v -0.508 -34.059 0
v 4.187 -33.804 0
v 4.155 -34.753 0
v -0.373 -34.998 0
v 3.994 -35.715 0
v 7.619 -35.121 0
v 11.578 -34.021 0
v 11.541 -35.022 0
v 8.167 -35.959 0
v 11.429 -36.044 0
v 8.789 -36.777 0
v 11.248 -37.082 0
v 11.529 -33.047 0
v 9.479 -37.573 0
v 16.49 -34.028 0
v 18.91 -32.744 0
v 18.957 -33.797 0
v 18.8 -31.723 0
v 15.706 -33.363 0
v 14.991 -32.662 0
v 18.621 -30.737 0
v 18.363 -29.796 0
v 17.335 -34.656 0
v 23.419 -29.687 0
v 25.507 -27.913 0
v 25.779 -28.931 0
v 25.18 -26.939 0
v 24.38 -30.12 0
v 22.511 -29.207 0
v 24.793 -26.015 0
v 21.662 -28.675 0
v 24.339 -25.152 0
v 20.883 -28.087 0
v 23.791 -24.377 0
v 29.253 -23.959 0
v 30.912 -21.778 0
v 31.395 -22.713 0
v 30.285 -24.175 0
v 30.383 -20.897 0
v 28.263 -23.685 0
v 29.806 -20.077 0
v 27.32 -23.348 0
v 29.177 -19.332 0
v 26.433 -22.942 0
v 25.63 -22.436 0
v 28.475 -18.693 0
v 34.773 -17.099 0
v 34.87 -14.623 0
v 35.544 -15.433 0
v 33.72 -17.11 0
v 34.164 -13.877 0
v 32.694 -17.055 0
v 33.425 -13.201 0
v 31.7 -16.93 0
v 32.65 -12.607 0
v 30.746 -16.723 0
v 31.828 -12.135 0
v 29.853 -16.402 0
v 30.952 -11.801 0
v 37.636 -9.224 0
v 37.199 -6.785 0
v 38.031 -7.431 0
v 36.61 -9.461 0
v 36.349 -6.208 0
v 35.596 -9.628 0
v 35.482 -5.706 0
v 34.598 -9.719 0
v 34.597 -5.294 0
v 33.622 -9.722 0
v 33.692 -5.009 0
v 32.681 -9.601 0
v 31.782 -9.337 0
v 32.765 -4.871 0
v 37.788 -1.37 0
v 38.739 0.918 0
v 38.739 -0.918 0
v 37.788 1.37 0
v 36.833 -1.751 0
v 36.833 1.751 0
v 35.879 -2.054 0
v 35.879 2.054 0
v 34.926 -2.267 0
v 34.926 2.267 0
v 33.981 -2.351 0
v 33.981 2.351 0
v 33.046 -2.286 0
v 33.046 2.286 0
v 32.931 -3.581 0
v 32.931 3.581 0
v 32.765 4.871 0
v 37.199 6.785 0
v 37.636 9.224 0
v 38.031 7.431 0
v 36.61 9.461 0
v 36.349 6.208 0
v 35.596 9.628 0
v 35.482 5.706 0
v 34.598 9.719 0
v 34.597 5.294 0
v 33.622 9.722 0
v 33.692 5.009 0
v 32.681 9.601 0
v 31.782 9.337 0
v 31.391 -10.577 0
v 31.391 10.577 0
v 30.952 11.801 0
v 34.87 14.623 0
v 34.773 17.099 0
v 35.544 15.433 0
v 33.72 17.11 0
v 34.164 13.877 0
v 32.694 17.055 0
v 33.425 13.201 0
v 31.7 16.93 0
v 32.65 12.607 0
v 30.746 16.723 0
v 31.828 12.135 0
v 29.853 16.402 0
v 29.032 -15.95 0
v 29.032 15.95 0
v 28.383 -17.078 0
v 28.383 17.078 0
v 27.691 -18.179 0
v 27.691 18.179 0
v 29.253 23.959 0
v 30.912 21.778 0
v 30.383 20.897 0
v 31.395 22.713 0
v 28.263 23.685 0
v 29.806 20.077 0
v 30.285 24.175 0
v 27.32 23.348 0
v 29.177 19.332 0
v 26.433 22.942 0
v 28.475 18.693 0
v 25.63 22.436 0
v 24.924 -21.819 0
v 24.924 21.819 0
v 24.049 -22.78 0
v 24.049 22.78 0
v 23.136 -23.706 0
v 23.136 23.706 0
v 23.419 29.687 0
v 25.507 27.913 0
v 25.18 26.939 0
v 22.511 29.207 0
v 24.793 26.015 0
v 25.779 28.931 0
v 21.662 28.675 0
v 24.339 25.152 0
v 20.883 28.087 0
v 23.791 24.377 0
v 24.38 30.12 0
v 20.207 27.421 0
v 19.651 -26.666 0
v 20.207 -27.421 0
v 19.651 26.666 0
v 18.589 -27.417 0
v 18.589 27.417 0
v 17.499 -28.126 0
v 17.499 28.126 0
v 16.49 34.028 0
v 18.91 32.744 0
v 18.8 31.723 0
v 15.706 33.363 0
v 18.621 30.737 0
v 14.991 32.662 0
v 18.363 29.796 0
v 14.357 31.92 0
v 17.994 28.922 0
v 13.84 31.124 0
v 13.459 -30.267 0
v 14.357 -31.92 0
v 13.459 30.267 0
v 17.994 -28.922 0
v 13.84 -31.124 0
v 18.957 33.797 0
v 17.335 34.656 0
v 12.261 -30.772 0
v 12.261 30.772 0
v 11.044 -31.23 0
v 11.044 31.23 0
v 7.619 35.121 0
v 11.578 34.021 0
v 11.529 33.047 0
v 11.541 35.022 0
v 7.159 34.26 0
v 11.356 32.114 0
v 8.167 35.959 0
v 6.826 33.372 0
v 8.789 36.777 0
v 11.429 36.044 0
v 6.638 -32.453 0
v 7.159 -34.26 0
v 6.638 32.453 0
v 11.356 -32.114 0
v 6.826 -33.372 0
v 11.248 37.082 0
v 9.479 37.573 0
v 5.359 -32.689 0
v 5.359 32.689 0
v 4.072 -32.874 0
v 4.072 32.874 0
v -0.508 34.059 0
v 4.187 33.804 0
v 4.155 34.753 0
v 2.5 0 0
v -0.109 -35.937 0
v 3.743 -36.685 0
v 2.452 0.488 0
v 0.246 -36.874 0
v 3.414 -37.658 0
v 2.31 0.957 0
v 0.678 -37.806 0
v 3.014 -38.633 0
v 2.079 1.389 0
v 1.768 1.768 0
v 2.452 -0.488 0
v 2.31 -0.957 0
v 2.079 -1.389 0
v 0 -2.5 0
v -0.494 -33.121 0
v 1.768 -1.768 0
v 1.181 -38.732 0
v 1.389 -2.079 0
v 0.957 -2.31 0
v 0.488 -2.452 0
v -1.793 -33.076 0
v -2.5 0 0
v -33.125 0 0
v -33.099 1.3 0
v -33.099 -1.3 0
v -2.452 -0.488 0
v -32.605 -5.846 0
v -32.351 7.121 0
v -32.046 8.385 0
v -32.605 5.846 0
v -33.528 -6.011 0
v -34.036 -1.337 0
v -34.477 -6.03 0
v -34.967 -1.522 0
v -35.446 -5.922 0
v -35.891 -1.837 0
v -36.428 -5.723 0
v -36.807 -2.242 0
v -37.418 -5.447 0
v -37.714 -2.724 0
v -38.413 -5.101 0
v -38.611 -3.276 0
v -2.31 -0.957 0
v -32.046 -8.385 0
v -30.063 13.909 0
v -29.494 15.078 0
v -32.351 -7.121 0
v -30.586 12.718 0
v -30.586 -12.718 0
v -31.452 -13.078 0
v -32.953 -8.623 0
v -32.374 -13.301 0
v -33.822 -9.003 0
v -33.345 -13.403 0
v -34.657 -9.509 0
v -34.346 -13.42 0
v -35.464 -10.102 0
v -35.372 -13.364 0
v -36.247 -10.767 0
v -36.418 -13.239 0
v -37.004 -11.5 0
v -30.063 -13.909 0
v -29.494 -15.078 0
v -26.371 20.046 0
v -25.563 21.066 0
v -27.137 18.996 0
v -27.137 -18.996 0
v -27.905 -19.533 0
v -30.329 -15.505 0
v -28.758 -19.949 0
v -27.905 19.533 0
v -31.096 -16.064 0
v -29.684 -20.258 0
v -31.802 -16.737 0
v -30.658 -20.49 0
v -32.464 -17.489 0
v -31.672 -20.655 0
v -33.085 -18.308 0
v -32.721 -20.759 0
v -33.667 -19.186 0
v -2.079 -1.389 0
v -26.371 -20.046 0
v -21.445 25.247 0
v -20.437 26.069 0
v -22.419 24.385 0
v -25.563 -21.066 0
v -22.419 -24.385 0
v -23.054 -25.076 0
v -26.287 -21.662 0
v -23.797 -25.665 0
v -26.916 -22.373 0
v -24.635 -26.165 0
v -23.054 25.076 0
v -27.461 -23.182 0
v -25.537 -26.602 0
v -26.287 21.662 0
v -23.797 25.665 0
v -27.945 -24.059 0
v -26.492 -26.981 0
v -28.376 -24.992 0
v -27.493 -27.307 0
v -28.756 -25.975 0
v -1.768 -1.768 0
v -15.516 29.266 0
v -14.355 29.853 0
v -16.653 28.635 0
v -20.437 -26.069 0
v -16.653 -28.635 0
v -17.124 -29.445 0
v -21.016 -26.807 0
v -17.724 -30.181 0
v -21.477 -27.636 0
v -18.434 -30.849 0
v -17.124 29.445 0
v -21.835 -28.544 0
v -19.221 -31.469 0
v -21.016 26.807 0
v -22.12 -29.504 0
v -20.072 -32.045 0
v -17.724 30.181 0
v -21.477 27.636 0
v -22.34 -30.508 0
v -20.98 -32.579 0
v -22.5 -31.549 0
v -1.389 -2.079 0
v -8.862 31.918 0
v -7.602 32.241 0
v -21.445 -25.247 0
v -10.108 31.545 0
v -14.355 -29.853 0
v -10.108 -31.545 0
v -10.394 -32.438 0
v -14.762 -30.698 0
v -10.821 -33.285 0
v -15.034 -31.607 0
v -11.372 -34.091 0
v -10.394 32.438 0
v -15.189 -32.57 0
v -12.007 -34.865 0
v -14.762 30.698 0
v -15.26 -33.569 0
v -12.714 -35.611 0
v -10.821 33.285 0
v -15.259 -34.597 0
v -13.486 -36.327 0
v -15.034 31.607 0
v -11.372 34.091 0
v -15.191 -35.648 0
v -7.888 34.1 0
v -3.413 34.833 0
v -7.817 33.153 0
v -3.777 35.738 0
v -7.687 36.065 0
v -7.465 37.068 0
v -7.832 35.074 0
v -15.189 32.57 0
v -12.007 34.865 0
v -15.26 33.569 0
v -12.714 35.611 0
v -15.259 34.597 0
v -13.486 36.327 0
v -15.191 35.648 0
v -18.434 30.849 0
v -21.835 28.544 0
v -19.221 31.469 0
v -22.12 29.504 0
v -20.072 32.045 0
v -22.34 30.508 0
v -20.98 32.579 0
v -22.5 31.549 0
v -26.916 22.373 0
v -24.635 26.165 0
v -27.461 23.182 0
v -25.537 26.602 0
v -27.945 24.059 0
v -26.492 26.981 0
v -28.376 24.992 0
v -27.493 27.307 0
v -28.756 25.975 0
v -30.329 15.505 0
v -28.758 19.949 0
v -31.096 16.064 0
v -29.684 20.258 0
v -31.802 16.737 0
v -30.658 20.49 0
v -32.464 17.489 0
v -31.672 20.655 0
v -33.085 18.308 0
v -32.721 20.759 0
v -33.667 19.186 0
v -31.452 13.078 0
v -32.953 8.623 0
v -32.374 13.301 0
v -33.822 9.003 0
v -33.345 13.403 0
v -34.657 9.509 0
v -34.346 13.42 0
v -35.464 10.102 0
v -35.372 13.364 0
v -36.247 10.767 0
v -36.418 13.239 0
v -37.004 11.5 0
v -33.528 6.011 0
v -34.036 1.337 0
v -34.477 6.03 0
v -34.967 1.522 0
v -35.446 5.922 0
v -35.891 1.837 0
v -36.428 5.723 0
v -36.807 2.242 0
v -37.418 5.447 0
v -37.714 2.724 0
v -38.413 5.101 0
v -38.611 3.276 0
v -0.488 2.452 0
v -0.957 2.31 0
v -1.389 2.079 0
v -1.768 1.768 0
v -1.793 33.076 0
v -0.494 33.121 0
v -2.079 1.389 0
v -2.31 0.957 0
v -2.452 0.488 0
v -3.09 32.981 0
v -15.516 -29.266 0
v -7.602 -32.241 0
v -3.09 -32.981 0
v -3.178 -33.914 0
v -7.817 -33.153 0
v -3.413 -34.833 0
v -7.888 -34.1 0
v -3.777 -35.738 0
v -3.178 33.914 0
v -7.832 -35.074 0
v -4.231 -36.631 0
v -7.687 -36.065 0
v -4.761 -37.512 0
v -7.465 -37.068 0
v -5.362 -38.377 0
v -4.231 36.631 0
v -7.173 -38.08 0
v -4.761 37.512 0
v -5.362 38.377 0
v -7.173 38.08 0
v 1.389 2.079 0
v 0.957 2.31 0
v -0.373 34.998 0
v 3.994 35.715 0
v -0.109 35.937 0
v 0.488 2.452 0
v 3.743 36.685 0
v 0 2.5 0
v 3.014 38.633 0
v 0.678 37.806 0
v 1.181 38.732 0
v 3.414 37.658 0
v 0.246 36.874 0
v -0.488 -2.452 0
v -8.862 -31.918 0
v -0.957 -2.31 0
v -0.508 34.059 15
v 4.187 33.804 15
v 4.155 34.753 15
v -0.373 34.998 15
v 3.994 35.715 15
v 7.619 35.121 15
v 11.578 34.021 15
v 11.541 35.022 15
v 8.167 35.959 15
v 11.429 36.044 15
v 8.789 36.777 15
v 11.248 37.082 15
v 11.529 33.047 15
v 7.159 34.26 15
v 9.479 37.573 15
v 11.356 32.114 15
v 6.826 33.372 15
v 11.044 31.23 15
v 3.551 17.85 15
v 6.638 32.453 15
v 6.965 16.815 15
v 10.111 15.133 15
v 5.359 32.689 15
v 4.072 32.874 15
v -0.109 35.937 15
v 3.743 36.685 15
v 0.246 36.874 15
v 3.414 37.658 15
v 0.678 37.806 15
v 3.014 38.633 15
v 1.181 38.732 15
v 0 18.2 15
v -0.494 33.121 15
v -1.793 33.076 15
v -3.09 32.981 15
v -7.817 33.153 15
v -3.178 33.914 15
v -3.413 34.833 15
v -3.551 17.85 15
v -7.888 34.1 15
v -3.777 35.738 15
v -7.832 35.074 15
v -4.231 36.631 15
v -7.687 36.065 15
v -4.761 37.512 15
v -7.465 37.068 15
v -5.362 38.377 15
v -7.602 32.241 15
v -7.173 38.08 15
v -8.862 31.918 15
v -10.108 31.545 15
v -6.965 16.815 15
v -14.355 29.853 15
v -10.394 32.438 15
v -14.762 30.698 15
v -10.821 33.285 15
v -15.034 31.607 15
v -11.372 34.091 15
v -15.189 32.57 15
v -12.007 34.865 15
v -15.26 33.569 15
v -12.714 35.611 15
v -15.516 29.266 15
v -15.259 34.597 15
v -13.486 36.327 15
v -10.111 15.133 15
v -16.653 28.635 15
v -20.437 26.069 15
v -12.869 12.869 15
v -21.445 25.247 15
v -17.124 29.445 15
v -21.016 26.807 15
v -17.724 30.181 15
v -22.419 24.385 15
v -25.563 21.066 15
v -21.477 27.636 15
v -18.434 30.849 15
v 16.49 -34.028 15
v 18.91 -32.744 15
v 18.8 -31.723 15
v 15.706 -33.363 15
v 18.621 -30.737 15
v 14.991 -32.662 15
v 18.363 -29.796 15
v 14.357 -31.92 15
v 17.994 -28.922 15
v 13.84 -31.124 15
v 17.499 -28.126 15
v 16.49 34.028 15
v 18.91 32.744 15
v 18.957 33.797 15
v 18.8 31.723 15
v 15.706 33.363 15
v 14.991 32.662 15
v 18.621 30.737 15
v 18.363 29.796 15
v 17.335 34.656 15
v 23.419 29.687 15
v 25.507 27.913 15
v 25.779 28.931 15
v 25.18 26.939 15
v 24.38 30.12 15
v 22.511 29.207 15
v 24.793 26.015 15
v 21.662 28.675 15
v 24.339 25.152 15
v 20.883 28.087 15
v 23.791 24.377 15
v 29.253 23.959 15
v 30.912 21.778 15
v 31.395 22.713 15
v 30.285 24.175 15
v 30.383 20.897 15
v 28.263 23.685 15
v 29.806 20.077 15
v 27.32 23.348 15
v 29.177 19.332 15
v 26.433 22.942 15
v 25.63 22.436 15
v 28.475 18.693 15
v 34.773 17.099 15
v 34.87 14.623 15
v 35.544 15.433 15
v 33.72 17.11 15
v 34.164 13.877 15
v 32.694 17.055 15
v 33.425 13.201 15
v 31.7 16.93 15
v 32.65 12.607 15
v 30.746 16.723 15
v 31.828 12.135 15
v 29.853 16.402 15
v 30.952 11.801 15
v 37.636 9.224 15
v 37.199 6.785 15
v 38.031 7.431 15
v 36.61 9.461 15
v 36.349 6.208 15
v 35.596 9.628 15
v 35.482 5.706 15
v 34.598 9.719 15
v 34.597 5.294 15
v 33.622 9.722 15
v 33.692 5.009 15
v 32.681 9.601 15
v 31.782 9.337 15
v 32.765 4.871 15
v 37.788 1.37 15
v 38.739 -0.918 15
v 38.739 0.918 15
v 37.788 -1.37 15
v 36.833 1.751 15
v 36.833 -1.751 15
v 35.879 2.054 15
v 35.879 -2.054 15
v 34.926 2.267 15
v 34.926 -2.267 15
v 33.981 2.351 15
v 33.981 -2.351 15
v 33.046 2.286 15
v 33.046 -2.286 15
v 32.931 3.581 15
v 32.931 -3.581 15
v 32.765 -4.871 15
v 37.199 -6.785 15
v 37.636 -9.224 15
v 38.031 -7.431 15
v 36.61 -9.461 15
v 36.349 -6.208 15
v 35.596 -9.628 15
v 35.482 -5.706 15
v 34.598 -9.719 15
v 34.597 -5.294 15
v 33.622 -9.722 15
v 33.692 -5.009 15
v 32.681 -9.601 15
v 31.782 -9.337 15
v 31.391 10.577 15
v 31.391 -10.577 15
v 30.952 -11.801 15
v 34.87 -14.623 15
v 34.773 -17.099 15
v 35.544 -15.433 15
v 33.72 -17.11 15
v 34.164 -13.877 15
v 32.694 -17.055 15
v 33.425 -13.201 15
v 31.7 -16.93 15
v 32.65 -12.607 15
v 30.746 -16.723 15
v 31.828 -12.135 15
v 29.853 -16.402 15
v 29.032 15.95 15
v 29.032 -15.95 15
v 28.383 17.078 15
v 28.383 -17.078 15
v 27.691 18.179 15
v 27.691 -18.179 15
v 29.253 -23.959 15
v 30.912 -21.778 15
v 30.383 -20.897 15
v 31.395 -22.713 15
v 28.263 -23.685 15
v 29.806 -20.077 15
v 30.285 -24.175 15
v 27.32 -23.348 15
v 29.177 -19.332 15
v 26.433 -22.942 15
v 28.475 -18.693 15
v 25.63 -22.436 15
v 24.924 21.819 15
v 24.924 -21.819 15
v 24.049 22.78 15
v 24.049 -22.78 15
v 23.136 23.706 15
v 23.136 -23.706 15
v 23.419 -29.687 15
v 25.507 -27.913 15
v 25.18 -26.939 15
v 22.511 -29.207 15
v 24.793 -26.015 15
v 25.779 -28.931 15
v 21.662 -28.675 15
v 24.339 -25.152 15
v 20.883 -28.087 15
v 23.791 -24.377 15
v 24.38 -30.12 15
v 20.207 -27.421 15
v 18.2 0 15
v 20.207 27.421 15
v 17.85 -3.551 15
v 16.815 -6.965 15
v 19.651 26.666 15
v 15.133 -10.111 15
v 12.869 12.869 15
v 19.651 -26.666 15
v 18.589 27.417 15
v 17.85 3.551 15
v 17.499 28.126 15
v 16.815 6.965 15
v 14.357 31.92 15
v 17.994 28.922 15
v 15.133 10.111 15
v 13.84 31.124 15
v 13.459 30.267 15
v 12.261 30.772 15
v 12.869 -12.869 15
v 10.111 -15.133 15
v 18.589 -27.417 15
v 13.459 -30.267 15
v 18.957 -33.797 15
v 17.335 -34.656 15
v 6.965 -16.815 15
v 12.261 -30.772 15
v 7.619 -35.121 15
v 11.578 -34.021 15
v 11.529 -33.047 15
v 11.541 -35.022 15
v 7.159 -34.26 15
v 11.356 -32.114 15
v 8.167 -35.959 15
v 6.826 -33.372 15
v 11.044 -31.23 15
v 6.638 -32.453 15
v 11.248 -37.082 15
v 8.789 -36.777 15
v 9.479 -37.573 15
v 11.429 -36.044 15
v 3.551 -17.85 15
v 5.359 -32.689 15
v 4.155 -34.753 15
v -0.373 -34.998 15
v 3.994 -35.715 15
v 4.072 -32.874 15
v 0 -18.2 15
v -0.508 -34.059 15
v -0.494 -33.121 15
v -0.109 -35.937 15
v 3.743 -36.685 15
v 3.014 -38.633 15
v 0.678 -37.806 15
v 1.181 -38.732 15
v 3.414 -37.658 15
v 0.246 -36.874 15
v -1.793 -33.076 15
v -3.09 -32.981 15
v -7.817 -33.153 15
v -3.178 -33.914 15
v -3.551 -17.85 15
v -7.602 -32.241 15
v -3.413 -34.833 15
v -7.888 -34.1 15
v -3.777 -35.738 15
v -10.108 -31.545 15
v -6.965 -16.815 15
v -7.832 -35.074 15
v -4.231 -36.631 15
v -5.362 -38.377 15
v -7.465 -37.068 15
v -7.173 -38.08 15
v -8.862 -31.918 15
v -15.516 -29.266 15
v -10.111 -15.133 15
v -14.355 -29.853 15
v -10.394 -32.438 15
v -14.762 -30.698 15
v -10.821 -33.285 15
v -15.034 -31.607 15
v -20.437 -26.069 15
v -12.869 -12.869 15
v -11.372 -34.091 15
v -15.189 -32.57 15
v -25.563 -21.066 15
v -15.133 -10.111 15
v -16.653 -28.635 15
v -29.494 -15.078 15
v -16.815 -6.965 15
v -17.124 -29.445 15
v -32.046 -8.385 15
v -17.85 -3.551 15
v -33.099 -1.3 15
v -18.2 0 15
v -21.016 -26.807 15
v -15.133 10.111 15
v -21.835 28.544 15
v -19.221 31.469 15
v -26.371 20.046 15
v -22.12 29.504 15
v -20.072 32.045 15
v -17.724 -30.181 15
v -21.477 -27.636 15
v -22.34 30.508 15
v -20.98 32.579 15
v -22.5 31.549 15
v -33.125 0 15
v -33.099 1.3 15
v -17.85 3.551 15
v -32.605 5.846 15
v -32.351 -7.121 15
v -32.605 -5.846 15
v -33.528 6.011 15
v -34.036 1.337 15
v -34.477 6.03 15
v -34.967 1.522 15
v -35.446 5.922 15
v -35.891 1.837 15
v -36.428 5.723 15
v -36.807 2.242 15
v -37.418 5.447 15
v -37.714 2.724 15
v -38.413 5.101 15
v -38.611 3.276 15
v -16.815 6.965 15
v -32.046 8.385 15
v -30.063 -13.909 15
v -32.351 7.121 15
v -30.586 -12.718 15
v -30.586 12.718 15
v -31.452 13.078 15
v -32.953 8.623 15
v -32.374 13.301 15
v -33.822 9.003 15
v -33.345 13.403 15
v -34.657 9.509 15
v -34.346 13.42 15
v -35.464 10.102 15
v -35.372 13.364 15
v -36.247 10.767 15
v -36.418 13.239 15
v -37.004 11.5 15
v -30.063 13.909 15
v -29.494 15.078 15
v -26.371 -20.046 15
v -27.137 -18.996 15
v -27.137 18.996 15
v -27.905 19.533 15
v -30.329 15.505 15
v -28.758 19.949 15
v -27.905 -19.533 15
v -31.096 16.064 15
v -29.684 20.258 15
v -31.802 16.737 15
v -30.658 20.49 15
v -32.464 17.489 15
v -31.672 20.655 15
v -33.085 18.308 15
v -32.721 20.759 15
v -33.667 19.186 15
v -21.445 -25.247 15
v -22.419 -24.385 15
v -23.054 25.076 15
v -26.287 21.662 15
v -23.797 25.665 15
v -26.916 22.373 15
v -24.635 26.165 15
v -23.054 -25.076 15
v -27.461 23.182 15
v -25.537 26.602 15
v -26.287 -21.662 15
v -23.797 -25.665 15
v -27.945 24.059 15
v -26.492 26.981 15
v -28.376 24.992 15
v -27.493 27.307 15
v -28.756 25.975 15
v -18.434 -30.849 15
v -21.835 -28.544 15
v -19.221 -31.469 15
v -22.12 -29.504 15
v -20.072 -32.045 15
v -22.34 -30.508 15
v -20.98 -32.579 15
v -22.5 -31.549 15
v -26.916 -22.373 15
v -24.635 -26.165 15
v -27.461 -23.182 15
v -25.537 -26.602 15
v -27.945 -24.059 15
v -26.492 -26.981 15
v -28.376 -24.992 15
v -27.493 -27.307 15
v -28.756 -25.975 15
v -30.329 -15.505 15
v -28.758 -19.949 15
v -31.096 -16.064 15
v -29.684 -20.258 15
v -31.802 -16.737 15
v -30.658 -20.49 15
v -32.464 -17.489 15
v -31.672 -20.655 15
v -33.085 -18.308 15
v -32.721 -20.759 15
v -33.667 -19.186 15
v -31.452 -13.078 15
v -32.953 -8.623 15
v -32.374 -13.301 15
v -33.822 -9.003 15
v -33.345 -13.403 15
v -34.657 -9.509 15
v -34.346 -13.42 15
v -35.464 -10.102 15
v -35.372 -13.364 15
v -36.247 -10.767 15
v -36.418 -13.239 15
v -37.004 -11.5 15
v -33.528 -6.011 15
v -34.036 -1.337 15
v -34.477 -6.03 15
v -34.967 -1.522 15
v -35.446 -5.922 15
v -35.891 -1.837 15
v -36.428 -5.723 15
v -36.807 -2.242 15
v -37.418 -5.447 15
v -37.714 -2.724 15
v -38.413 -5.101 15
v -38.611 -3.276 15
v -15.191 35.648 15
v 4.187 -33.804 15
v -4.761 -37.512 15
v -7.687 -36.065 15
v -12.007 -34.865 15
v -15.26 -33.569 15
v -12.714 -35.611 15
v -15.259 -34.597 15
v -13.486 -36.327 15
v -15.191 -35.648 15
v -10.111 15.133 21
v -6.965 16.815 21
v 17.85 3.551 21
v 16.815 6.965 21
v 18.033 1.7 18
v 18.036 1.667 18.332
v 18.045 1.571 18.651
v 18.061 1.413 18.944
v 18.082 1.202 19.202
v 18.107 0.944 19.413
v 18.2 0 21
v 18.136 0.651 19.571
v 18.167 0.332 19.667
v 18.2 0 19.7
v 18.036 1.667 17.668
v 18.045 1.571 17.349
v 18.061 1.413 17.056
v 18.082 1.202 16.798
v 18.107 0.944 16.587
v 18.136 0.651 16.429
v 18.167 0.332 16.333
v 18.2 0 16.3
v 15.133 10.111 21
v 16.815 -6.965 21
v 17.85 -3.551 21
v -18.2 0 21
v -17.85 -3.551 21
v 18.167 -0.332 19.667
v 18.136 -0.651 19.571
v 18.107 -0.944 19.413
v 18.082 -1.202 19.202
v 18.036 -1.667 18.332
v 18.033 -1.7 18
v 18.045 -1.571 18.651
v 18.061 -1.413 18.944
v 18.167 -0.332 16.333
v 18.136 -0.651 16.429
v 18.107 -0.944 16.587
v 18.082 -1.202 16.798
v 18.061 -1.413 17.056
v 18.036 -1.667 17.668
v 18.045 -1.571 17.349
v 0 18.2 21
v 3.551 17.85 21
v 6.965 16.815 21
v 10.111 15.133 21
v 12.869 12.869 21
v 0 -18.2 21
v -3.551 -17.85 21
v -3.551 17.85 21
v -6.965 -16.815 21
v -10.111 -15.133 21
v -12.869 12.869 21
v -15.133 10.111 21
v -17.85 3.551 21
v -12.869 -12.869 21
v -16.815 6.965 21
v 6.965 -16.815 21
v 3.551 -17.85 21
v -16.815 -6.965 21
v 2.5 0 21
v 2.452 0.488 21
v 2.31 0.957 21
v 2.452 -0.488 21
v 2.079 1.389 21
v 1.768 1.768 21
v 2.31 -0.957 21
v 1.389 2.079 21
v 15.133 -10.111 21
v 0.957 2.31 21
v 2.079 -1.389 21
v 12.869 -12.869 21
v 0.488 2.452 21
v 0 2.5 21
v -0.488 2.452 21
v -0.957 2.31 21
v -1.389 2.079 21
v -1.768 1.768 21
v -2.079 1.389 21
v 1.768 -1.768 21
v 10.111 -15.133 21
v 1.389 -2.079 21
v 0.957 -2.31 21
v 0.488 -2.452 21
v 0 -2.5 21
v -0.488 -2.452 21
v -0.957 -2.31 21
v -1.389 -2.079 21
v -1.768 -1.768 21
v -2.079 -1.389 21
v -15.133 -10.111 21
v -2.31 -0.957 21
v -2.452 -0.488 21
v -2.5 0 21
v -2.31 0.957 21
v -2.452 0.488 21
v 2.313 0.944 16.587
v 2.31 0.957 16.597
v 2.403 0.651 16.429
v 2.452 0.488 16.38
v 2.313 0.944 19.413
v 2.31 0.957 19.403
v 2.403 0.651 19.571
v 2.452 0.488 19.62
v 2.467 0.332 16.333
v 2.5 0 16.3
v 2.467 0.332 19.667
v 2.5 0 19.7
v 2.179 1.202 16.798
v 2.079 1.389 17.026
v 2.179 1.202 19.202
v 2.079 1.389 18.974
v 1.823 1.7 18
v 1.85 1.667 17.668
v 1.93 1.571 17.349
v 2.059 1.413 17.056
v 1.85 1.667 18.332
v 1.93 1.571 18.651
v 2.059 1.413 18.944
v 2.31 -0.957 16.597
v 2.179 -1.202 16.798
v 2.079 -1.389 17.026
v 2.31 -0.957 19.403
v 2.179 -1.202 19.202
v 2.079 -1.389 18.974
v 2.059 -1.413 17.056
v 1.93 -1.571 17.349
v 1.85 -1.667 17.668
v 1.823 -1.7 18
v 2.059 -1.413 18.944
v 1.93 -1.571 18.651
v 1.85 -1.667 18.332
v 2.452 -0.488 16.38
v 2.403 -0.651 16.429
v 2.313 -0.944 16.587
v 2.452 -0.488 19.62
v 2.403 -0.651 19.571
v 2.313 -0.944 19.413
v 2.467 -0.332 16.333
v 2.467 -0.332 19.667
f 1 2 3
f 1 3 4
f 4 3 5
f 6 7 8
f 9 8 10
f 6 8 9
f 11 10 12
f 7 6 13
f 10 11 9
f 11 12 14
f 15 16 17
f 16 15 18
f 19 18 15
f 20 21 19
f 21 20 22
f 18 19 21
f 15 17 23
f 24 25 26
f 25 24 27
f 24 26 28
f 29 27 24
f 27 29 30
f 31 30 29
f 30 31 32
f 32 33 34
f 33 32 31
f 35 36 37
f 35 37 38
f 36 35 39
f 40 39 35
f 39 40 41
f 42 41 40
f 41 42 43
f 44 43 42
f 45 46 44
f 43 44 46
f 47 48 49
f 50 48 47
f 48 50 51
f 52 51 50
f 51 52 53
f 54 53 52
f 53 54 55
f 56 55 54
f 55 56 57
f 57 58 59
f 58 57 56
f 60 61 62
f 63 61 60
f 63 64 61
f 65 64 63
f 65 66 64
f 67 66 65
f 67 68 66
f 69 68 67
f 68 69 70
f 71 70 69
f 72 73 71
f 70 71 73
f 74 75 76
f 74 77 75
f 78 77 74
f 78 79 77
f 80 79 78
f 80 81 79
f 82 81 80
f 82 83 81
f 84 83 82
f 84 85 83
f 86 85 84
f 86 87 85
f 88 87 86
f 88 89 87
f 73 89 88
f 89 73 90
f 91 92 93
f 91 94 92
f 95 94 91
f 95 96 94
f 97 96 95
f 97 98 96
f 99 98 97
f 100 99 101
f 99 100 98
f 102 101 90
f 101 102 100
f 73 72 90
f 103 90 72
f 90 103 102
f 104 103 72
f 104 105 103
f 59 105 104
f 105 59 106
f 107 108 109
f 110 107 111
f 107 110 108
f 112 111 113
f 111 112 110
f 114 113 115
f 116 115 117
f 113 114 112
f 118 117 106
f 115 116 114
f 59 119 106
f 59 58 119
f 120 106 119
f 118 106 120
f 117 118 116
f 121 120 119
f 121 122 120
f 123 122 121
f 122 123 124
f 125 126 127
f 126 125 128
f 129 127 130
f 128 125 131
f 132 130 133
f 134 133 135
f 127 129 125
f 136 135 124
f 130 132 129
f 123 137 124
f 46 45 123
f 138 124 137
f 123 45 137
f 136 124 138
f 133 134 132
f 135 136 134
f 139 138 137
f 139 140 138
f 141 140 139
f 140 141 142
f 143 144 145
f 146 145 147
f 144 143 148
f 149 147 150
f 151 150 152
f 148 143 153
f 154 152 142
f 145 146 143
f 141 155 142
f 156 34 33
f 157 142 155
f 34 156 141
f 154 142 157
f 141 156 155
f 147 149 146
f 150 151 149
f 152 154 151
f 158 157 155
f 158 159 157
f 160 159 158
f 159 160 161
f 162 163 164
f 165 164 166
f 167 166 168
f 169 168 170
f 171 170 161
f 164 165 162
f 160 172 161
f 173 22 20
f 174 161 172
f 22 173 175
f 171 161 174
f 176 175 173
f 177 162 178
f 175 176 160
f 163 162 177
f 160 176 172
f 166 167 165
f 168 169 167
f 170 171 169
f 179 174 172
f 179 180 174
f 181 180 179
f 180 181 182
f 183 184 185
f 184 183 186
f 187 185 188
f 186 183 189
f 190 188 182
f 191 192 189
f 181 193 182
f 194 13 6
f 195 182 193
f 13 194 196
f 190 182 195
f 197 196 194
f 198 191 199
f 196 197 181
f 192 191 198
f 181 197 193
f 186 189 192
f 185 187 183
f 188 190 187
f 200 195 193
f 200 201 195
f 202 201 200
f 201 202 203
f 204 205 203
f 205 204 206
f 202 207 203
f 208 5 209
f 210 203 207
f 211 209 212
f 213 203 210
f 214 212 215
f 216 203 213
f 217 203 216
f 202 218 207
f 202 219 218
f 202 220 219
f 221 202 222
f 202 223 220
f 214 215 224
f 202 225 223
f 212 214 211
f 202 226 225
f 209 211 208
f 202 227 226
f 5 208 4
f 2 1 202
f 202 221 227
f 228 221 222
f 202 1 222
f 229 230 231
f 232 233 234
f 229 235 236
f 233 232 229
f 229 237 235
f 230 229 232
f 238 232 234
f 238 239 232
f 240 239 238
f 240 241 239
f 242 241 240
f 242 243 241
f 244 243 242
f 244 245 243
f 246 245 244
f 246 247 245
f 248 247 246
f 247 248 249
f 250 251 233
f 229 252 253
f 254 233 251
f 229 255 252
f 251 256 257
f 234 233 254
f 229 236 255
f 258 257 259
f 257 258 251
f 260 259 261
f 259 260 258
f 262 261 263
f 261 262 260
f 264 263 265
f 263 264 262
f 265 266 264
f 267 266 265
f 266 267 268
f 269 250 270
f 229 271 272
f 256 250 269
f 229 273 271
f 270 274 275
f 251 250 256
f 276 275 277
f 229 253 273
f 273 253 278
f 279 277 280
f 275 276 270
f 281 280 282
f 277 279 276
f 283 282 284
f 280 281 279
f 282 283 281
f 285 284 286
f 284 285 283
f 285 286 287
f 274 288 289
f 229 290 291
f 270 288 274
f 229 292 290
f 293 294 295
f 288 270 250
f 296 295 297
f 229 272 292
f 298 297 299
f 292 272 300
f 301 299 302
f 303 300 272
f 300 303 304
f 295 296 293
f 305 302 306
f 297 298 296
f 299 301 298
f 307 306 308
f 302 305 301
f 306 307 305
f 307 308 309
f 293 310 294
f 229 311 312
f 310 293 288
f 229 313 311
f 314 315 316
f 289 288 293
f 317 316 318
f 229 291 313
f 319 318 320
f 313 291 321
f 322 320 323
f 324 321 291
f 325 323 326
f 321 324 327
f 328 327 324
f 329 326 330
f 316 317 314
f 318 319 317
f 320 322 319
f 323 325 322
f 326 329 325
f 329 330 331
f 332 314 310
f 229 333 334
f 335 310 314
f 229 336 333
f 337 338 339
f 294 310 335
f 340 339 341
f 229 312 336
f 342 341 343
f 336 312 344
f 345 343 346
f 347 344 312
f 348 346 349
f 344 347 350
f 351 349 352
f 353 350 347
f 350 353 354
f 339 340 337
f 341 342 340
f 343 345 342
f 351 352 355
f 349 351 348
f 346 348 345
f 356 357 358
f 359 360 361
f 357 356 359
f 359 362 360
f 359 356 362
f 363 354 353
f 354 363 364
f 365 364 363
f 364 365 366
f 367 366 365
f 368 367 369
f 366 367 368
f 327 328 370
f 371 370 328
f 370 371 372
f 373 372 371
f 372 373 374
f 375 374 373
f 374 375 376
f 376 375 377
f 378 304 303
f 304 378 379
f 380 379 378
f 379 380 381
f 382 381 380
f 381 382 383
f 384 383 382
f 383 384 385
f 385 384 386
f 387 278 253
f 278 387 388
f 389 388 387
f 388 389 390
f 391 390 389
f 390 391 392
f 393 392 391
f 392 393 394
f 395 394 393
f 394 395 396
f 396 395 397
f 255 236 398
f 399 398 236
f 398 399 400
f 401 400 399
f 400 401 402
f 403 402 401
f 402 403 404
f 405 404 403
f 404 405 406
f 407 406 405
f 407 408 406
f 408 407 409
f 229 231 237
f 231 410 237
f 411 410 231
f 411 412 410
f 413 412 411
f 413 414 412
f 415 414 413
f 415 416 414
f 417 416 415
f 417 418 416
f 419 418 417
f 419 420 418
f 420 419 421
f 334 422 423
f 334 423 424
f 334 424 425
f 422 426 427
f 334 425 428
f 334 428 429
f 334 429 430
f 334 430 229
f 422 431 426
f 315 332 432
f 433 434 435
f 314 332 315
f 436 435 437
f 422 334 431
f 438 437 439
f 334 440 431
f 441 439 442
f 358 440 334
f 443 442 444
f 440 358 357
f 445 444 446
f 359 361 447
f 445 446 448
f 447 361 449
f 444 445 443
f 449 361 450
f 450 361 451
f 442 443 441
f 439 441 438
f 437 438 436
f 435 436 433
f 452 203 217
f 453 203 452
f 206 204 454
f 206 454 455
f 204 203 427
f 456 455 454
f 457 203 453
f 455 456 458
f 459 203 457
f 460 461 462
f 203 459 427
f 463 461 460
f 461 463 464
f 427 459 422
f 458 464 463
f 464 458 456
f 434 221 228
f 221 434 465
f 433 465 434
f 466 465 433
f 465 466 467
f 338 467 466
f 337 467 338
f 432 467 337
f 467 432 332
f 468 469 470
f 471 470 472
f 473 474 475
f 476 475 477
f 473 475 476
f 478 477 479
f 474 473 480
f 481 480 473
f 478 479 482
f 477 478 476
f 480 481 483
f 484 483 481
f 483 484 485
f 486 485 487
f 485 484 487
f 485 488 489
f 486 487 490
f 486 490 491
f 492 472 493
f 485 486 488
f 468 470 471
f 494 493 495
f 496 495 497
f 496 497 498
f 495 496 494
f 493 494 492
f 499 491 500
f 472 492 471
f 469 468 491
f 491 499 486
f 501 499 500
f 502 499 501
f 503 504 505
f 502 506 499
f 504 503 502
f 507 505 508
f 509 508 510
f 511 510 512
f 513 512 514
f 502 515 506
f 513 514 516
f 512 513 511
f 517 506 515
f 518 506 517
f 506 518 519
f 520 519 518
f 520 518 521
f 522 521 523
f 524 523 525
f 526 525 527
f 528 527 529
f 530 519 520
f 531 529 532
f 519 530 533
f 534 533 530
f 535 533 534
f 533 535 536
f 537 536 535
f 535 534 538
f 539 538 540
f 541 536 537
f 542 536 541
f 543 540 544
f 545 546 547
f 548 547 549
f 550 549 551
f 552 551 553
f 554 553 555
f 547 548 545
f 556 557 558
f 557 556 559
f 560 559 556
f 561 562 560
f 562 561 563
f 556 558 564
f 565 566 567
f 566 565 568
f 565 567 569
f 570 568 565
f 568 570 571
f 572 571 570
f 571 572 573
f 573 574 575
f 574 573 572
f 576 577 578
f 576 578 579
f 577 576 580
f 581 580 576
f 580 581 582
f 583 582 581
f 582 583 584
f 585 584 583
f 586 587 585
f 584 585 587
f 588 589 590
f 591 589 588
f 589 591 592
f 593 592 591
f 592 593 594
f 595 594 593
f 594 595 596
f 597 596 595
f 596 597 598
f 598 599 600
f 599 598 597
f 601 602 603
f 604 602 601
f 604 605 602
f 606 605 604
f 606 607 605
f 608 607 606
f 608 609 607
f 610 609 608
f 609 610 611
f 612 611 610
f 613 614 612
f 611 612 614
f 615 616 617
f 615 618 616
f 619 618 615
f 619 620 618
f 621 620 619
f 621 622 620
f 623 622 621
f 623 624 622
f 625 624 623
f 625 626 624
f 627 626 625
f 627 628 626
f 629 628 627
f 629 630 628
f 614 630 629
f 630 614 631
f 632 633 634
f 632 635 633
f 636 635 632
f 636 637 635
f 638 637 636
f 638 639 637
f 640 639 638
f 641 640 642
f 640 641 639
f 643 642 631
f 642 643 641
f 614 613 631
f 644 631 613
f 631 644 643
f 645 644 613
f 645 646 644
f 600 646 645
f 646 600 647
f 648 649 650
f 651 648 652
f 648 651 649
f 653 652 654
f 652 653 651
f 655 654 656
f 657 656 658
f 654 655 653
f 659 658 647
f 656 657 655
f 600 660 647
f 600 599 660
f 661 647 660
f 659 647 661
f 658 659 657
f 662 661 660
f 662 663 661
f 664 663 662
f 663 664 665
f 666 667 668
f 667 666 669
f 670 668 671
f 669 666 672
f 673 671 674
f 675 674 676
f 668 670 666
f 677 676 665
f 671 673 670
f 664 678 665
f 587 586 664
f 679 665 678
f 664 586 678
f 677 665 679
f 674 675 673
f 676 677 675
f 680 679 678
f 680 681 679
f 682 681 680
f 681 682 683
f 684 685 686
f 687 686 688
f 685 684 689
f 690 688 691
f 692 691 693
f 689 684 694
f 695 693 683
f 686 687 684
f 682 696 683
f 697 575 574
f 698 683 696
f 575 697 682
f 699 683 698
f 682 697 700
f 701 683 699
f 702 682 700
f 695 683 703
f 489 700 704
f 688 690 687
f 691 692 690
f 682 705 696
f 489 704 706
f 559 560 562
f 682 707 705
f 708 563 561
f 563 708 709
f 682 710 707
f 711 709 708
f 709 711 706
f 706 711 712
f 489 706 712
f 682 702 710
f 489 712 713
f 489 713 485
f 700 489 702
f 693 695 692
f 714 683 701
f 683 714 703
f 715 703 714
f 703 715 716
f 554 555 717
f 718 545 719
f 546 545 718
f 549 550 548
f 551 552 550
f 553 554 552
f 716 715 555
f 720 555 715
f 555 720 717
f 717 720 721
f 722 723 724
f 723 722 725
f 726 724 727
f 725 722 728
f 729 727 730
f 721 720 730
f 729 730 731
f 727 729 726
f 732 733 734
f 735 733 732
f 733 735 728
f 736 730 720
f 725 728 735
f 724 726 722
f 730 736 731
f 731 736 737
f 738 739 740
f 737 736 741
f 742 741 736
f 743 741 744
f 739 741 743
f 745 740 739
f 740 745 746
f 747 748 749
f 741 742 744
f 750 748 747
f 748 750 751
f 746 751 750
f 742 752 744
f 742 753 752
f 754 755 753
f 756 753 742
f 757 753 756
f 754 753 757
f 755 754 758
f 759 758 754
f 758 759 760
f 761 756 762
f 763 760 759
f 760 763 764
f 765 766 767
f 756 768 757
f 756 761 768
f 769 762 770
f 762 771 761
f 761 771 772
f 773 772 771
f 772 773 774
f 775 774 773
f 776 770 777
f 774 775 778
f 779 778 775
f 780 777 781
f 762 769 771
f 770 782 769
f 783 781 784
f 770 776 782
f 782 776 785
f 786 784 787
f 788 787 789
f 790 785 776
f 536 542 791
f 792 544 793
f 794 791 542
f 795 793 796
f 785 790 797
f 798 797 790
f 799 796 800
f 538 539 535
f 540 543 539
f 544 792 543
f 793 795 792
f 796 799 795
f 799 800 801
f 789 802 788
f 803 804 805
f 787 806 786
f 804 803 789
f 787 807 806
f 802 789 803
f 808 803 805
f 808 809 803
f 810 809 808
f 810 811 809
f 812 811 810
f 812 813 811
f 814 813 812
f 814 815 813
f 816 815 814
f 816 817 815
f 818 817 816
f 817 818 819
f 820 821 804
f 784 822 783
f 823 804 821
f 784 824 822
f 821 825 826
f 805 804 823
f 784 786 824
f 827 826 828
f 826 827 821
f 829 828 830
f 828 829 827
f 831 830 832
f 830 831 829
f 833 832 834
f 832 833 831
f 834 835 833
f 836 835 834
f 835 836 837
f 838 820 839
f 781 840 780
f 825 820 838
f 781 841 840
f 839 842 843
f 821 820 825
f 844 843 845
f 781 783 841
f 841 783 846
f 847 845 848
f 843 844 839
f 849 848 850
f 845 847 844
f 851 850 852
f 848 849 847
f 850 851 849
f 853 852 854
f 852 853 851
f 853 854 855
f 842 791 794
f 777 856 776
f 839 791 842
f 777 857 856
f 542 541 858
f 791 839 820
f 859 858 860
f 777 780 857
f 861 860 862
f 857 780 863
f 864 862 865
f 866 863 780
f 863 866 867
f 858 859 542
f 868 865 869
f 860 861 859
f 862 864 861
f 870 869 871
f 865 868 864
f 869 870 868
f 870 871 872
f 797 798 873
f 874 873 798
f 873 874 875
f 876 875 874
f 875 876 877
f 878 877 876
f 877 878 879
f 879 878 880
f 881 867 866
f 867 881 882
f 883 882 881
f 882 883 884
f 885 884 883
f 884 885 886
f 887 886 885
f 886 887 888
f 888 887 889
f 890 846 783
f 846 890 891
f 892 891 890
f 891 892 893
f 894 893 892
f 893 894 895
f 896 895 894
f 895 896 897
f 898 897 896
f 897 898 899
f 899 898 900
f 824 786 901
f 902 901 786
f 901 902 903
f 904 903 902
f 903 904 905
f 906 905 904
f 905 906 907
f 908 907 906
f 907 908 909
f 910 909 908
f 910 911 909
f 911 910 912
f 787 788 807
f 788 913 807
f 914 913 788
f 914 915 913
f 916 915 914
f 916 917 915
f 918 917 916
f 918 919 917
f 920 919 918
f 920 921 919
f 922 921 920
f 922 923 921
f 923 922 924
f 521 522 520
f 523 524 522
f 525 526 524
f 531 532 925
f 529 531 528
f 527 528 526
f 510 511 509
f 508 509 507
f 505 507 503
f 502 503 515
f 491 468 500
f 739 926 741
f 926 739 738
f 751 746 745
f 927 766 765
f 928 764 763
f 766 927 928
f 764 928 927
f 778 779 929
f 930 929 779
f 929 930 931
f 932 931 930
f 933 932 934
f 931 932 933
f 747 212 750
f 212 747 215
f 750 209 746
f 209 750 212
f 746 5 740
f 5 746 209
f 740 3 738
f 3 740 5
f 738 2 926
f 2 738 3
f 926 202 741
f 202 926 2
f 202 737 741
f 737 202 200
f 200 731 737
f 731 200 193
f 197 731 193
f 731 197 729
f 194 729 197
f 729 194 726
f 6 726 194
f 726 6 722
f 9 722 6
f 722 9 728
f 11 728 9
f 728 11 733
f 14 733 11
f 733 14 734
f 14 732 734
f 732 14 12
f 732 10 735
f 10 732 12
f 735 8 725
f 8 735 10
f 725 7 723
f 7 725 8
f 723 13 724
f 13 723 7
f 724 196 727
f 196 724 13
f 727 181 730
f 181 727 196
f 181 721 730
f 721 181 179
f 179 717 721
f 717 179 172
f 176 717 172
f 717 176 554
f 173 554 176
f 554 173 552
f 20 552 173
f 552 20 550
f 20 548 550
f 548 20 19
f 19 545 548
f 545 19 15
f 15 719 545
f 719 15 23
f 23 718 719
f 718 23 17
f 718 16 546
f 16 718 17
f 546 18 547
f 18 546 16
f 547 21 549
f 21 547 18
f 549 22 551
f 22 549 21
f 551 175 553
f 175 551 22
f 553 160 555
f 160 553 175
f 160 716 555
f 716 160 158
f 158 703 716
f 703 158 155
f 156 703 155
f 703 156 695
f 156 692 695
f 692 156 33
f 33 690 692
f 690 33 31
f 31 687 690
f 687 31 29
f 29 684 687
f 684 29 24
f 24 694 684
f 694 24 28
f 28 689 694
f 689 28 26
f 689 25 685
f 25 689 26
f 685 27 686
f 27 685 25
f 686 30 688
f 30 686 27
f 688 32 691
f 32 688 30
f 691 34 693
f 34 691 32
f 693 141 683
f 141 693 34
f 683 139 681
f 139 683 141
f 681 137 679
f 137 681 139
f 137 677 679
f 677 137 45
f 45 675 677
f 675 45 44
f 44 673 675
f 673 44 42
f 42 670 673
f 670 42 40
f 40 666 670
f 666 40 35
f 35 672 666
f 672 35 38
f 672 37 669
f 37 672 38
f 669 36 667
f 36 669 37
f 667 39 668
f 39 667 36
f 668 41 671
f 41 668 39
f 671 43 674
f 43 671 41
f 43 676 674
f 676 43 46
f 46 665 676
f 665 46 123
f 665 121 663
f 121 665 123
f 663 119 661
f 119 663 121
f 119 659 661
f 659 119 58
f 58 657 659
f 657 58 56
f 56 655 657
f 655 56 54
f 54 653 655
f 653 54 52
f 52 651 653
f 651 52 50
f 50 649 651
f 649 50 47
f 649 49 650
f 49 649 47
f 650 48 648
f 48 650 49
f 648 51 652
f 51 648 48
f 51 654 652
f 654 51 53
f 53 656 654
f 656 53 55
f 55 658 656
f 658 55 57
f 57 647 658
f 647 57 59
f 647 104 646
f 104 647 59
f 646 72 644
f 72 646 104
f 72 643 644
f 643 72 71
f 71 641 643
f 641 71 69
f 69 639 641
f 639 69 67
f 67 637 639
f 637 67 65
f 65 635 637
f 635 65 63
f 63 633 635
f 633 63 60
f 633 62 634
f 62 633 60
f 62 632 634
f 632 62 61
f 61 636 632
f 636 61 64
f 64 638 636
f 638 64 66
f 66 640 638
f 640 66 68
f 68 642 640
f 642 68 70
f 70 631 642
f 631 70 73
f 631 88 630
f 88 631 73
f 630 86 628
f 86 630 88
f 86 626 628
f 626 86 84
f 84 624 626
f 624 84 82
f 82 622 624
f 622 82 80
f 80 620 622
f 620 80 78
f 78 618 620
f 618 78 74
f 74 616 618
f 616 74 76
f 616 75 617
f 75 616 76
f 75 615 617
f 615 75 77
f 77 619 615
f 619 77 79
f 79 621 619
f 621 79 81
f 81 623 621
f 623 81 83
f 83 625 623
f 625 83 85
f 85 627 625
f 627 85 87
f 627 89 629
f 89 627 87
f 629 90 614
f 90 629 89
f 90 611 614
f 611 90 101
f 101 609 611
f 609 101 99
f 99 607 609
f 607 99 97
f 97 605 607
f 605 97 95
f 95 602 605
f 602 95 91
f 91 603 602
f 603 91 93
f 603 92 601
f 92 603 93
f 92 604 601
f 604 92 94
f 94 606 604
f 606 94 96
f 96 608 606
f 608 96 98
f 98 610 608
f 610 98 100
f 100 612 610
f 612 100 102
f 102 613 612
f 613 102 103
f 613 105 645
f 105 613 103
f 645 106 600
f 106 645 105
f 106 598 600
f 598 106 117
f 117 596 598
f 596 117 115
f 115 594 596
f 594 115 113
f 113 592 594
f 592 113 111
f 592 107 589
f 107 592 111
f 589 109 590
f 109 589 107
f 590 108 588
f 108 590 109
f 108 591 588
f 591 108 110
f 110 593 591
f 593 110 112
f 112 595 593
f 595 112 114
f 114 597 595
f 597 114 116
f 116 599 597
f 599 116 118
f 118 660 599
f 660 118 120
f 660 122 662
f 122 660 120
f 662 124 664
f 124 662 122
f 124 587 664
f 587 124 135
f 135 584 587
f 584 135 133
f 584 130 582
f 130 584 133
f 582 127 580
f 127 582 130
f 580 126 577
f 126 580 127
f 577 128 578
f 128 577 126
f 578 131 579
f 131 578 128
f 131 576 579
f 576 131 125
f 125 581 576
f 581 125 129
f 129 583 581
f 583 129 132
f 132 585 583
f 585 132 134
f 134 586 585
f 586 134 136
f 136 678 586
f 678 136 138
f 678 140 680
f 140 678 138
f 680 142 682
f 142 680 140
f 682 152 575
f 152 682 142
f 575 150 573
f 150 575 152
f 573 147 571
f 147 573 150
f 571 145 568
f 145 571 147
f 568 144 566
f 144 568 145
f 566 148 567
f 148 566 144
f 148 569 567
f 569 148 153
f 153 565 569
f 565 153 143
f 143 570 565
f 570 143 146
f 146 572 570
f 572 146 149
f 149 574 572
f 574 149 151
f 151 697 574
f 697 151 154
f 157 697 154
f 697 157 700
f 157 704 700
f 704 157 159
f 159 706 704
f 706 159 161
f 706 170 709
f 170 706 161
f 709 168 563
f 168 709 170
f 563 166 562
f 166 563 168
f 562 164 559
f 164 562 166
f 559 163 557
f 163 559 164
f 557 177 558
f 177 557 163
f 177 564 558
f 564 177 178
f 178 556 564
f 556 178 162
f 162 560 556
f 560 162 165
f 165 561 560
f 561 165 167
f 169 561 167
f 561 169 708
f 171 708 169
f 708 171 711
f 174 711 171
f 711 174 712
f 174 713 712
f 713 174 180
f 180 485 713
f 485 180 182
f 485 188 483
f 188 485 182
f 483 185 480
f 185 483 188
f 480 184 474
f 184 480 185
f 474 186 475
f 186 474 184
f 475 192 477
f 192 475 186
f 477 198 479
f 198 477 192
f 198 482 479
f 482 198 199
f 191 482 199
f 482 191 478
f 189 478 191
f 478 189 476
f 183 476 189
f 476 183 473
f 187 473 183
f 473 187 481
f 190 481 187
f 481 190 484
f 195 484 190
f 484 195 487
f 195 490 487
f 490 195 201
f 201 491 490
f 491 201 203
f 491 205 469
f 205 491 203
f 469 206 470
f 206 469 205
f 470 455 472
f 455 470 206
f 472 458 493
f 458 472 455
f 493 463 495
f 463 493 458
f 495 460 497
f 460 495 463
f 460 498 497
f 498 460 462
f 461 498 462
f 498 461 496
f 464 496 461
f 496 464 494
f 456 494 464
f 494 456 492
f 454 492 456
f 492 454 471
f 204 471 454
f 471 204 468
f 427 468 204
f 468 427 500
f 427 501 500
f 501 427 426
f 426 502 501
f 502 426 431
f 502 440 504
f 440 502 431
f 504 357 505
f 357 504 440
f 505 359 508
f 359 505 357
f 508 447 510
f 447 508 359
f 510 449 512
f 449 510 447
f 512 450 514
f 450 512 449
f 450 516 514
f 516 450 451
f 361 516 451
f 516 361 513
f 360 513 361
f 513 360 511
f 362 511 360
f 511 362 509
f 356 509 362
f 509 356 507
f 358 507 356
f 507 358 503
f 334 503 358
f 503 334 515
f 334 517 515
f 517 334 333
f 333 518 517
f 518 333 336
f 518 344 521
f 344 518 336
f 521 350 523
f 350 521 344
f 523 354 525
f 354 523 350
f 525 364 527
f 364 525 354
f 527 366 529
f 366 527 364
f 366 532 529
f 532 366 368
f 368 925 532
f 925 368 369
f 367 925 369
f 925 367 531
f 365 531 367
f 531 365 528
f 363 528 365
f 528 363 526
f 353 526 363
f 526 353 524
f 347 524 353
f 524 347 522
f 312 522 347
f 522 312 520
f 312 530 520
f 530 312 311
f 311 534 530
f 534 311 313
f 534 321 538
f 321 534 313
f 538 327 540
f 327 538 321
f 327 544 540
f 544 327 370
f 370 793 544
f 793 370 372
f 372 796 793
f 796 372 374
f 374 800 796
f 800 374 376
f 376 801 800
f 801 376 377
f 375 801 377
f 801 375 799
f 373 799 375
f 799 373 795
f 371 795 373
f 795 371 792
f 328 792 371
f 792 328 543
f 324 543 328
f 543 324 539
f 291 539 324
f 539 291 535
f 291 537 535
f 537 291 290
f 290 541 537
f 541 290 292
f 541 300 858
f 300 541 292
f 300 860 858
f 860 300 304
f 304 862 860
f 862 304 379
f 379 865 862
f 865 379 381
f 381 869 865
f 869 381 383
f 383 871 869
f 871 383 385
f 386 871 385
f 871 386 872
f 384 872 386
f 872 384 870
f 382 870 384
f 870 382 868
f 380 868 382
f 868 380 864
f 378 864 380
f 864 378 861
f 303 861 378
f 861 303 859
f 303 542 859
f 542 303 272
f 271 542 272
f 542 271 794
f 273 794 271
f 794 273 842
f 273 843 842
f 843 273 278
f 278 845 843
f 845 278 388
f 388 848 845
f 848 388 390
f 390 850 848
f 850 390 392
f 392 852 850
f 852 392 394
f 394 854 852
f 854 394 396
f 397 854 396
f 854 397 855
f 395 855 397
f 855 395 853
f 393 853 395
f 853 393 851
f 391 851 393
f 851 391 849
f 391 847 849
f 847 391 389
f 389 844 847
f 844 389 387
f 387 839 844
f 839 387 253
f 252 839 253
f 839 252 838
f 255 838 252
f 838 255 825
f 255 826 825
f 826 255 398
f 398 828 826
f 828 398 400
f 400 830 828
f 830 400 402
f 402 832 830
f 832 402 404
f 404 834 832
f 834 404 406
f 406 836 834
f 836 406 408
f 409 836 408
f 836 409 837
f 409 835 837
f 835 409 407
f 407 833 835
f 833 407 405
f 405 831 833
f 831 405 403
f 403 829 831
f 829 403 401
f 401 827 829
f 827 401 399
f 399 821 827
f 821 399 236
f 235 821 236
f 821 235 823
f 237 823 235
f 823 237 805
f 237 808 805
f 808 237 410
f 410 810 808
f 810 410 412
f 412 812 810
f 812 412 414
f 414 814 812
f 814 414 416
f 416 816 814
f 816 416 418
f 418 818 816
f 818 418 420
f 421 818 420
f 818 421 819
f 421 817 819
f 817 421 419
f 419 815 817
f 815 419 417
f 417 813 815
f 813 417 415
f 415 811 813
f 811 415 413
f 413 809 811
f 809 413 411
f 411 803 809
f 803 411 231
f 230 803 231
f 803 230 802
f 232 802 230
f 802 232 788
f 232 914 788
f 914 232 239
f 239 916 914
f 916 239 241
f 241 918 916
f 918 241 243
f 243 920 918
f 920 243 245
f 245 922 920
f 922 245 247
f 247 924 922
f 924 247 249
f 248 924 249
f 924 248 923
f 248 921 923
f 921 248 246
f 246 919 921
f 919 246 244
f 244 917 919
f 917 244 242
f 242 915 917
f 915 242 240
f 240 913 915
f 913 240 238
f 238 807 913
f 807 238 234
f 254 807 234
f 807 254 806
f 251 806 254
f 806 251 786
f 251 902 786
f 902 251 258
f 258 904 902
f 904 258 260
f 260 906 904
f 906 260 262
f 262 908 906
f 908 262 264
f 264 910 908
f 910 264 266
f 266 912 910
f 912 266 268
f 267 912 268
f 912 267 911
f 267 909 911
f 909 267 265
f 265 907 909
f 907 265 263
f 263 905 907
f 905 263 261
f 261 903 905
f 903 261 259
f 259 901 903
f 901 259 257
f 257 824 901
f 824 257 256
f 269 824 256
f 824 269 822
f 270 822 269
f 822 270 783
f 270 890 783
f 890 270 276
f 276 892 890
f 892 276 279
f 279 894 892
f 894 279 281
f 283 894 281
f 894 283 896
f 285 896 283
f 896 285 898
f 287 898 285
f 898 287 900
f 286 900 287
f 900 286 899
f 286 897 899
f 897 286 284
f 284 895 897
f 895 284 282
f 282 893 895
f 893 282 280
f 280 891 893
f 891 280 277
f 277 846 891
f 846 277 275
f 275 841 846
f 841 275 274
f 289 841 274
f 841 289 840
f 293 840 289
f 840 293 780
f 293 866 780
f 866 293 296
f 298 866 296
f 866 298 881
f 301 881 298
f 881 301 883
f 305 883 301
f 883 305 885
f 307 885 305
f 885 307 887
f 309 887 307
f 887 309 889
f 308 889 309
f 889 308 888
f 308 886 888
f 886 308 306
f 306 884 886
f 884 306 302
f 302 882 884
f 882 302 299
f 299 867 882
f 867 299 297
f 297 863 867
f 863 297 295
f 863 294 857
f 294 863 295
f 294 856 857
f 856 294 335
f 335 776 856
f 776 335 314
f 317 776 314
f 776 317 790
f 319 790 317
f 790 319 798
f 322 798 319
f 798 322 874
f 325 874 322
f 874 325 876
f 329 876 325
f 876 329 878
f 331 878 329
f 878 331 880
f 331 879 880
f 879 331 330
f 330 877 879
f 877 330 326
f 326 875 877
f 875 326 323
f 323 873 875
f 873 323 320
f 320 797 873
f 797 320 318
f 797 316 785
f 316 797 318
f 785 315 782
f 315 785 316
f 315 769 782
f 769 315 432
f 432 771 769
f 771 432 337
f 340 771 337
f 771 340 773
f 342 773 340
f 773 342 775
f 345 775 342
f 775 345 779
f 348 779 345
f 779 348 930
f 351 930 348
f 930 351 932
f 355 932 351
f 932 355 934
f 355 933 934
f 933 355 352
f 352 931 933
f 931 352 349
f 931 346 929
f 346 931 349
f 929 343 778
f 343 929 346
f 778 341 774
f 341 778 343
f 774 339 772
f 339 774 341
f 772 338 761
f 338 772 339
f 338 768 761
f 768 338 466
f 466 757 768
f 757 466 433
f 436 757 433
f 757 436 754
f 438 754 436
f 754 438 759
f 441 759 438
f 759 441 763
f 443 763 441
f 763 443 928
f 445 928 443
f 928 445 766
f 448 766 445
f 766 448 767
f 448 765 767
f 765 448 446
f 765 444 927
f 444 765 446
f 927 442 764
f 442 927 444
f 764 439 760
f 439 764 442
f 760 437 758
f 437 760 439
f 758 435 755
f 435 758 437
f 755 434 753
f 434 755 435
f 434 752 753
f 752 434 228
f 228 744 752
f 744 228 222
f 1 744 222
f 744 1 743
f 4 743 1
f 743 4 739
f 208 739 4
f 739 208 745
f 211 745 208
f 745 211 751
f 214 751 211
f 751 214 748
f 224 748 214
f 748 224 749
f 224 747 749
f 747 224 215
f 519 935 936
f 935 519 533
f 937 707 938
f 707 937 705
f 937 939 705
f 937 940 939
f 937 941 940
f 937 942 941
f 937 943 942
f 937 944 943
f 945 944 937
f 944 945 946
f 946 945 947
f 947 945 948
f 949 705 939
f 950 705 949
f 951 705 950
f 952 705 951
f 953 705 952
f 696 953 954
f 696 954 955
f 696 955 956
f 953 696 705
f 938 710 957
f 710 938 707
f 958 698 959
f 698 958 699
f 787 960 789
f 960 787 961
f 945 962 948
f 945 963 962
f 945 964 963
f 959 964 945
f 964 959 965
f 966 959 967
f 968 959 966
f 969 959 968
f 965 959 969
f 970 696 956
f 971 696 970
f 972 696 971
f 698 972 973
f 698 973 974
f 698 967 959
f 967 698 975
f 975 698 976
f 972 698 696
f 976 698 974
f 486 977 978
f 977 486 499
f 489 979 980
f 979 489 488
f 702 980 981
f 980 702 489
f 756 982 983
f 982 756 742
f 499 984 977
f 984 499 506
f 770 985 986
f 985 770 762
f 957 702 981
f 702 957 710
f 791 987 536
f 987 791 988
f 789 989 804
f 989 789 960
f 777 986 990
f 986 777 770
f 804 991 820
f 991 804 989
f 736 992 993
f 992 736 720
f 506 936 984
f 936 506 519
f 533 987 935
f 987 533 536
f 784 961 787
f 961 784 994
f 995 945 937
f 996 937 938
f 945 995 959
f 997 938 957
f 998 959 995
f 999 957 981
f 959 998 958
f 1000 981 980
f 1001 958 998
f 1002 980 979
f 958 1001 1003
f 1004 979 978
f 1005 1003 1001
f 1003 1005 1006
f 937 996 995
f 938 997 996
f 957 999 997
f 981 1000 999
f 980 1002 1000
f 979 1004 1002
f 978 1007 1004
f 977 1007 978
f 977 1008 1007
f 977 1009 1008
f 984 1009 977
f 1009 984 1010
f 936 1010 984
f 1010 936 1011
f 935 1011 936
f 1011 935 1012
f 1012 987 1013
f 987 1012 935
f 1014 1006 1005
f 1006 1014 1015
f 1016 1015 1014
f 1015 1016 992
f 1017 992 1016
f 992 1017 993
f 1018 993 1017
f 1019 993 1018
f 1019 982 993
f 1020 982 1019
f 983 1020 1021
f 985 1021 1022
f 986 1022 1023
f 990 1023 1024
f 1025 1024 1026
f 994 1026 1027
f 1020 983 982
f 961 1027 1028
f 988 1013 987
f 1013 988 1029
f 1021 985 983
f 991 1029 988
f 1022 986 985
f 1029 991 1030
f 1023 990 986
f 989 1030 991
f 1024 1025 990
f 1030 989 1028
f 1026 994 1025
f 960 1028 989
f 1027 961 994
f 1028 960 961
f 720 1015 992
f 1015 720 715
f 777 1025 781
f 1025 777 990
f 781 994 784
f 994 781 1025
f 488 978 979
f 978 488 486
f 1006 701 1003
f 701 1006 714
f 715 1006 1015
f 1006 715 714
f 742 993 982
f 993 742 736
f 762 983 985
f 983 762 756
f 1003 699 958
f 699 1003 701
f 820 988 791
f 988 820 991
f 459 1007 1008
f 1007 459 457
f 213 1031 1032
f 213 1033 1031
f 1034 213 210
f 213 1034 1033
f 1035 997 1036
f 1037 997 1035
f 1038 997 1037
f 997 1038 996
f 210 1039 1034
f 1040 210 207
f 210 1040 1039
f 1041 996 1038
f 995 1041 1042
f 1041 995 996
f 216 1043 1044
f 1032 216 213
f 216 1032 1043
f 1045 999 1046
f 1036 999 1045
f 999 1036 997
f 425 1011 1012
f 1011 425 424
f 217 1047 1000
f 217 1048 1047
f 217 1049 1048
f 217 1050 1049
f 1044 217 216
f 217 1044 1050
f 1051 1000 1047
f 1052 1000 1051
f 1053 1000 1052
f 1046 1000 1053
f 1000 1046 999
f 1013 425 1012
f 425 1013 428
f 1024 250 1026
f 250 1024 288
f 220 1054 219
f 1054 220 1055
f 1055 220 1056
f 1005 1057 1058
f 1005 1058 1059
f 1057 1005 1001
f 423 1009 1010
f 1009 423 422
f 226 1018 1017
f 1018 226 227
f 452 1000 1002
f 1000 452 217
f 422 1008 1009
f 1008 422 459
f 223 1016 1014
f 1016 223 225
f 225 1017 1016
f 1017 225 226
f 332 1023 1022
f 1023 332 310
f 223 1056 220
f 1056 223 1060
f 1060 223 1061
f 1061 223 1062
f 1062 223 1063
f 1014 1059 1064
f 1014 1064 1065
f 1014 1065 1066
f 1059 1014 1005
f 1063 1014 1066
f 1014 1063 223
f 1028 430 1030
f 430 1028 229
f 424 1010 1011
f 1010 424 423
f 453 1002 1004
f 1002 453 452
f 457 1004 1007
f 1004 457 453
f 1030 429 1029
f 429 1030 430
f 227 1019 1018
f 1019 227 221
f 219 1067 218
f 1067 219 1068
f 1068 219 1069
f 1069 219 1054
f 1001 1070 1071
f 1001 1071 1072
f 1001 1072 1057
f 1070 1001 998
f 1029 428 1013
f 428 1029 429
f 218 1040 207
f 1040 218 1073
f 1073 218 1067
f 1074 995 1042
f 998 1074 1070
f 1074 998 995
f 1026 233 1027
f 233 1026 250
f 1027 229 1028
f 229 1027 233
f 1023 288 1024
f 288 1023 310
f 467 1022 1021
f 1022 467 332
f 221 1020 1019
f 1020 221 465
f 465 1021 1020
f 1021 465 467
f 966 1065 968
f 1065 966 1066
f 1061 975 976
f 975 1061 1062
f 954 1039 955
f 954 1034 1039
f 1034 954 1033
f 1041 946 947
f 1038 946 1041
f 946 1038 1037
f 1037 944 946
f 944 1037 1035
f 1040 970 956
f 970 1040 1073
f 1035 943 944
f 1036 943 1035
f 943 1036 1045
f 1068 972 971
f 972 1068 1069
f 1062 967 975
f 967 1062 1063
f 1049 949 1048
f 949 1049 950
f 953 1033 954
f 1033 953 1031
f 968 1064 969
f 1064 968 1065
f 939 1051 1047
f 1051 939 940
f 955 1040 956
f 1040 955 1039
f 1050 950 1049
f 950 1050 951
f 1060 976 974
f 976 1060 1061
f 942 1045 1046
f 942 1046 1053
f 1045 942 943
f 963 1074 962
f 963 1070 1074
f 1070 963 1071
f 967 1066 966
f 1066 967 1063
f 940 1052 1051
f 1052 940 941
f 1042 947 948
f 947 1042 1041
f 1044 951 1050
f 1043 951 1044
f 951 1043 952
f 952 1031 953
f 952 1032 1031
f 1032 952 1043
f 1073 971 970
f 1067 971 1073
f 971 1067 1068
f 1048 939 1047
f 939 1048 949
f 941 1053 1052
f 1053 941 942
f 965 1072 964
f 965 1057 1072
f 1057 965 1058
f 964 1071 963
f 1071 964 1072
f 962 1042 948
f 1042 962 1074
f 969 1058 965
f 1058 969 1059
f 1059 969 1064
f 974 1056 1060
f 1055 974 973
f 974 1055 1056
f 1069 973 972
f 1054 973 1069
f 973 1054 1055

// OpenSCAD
$fn = 32;

// ----------------------------------------------------------------------
// Spur gear: m=2.5 z=29, 77.5 mm tip diameter x 21 mm
// ----------------------------------------------------------------------

// --- parameters (mm) ---
module_m = 2.5;           // module
teeth = 29;               // number of teeth
face_w = 15;              // face width
pa = 20;                  // pressure angle, deg
bore_d = 5;               // shaft bore
hub_d = 36.4;             // hub diameter
hub_h = 6;                // hub above the face
set_d = 3.4;              // set screw tap hole
set_z = 18;               // set screw height

/* --- involute profile --- */
pitch_r = module_m * teeth / 2;
base_r = pitch_r * cos(pa);
tip_r = pitch_r + module_m;
root_r = pitch_r - 1.25 * module_m;
flank_steps = 6;

function inv_deg(a) = (tan(a) - a * PI / 180) * 180 / PI;
function flank_r(i) = root_r + (tip_r - root_r) * i / flank_steps;
function half_angle(r) = 90 / teeth + inv_deg(pa) - inv_deg(acos(min(1, base_r / r)));
function tooth_pt(k, i, side) =
    let (r = flank_r(i), a = k * 360 / teeth + side * half_angle(r))
    [r * cos(a), r * sin(a)];

module tooth_profile() {
  polygon(points = [
    for (k = [0 : teeth - 1])
      each [
        for (i = [0 : flank_steps]) tooth_pt(k, i, -1),
        for (i = [flank_steps : -1 : 0]) tooth_pt(k, i, 1),
        let (ta = (k + 0.5) * 360 / teeth)
          [root_r * cos(ta), root_r * sin(ta)]
      ]
  ]);
}

module gear_disc() {
  linear_extrude(height = face_w) tooth_profile();
}

module hub_boss() {
  translate([0, 0, face_w - 1]) cylinder(h = hub_h + 1, d = hub_d);
}

difference() {
  union() {
    gear_disc();
    hub_boss();
  }
  translate([0, 0, -1]) cylinder(h = face_w + hub_h + 3, d = bore_d);
  /* set screw, drilled radially */
  translate([-1, 0, set_z]) rotate([0, 90, 0]) cylinder(h = hub_d / 2 + 3, d = set_d);
}
